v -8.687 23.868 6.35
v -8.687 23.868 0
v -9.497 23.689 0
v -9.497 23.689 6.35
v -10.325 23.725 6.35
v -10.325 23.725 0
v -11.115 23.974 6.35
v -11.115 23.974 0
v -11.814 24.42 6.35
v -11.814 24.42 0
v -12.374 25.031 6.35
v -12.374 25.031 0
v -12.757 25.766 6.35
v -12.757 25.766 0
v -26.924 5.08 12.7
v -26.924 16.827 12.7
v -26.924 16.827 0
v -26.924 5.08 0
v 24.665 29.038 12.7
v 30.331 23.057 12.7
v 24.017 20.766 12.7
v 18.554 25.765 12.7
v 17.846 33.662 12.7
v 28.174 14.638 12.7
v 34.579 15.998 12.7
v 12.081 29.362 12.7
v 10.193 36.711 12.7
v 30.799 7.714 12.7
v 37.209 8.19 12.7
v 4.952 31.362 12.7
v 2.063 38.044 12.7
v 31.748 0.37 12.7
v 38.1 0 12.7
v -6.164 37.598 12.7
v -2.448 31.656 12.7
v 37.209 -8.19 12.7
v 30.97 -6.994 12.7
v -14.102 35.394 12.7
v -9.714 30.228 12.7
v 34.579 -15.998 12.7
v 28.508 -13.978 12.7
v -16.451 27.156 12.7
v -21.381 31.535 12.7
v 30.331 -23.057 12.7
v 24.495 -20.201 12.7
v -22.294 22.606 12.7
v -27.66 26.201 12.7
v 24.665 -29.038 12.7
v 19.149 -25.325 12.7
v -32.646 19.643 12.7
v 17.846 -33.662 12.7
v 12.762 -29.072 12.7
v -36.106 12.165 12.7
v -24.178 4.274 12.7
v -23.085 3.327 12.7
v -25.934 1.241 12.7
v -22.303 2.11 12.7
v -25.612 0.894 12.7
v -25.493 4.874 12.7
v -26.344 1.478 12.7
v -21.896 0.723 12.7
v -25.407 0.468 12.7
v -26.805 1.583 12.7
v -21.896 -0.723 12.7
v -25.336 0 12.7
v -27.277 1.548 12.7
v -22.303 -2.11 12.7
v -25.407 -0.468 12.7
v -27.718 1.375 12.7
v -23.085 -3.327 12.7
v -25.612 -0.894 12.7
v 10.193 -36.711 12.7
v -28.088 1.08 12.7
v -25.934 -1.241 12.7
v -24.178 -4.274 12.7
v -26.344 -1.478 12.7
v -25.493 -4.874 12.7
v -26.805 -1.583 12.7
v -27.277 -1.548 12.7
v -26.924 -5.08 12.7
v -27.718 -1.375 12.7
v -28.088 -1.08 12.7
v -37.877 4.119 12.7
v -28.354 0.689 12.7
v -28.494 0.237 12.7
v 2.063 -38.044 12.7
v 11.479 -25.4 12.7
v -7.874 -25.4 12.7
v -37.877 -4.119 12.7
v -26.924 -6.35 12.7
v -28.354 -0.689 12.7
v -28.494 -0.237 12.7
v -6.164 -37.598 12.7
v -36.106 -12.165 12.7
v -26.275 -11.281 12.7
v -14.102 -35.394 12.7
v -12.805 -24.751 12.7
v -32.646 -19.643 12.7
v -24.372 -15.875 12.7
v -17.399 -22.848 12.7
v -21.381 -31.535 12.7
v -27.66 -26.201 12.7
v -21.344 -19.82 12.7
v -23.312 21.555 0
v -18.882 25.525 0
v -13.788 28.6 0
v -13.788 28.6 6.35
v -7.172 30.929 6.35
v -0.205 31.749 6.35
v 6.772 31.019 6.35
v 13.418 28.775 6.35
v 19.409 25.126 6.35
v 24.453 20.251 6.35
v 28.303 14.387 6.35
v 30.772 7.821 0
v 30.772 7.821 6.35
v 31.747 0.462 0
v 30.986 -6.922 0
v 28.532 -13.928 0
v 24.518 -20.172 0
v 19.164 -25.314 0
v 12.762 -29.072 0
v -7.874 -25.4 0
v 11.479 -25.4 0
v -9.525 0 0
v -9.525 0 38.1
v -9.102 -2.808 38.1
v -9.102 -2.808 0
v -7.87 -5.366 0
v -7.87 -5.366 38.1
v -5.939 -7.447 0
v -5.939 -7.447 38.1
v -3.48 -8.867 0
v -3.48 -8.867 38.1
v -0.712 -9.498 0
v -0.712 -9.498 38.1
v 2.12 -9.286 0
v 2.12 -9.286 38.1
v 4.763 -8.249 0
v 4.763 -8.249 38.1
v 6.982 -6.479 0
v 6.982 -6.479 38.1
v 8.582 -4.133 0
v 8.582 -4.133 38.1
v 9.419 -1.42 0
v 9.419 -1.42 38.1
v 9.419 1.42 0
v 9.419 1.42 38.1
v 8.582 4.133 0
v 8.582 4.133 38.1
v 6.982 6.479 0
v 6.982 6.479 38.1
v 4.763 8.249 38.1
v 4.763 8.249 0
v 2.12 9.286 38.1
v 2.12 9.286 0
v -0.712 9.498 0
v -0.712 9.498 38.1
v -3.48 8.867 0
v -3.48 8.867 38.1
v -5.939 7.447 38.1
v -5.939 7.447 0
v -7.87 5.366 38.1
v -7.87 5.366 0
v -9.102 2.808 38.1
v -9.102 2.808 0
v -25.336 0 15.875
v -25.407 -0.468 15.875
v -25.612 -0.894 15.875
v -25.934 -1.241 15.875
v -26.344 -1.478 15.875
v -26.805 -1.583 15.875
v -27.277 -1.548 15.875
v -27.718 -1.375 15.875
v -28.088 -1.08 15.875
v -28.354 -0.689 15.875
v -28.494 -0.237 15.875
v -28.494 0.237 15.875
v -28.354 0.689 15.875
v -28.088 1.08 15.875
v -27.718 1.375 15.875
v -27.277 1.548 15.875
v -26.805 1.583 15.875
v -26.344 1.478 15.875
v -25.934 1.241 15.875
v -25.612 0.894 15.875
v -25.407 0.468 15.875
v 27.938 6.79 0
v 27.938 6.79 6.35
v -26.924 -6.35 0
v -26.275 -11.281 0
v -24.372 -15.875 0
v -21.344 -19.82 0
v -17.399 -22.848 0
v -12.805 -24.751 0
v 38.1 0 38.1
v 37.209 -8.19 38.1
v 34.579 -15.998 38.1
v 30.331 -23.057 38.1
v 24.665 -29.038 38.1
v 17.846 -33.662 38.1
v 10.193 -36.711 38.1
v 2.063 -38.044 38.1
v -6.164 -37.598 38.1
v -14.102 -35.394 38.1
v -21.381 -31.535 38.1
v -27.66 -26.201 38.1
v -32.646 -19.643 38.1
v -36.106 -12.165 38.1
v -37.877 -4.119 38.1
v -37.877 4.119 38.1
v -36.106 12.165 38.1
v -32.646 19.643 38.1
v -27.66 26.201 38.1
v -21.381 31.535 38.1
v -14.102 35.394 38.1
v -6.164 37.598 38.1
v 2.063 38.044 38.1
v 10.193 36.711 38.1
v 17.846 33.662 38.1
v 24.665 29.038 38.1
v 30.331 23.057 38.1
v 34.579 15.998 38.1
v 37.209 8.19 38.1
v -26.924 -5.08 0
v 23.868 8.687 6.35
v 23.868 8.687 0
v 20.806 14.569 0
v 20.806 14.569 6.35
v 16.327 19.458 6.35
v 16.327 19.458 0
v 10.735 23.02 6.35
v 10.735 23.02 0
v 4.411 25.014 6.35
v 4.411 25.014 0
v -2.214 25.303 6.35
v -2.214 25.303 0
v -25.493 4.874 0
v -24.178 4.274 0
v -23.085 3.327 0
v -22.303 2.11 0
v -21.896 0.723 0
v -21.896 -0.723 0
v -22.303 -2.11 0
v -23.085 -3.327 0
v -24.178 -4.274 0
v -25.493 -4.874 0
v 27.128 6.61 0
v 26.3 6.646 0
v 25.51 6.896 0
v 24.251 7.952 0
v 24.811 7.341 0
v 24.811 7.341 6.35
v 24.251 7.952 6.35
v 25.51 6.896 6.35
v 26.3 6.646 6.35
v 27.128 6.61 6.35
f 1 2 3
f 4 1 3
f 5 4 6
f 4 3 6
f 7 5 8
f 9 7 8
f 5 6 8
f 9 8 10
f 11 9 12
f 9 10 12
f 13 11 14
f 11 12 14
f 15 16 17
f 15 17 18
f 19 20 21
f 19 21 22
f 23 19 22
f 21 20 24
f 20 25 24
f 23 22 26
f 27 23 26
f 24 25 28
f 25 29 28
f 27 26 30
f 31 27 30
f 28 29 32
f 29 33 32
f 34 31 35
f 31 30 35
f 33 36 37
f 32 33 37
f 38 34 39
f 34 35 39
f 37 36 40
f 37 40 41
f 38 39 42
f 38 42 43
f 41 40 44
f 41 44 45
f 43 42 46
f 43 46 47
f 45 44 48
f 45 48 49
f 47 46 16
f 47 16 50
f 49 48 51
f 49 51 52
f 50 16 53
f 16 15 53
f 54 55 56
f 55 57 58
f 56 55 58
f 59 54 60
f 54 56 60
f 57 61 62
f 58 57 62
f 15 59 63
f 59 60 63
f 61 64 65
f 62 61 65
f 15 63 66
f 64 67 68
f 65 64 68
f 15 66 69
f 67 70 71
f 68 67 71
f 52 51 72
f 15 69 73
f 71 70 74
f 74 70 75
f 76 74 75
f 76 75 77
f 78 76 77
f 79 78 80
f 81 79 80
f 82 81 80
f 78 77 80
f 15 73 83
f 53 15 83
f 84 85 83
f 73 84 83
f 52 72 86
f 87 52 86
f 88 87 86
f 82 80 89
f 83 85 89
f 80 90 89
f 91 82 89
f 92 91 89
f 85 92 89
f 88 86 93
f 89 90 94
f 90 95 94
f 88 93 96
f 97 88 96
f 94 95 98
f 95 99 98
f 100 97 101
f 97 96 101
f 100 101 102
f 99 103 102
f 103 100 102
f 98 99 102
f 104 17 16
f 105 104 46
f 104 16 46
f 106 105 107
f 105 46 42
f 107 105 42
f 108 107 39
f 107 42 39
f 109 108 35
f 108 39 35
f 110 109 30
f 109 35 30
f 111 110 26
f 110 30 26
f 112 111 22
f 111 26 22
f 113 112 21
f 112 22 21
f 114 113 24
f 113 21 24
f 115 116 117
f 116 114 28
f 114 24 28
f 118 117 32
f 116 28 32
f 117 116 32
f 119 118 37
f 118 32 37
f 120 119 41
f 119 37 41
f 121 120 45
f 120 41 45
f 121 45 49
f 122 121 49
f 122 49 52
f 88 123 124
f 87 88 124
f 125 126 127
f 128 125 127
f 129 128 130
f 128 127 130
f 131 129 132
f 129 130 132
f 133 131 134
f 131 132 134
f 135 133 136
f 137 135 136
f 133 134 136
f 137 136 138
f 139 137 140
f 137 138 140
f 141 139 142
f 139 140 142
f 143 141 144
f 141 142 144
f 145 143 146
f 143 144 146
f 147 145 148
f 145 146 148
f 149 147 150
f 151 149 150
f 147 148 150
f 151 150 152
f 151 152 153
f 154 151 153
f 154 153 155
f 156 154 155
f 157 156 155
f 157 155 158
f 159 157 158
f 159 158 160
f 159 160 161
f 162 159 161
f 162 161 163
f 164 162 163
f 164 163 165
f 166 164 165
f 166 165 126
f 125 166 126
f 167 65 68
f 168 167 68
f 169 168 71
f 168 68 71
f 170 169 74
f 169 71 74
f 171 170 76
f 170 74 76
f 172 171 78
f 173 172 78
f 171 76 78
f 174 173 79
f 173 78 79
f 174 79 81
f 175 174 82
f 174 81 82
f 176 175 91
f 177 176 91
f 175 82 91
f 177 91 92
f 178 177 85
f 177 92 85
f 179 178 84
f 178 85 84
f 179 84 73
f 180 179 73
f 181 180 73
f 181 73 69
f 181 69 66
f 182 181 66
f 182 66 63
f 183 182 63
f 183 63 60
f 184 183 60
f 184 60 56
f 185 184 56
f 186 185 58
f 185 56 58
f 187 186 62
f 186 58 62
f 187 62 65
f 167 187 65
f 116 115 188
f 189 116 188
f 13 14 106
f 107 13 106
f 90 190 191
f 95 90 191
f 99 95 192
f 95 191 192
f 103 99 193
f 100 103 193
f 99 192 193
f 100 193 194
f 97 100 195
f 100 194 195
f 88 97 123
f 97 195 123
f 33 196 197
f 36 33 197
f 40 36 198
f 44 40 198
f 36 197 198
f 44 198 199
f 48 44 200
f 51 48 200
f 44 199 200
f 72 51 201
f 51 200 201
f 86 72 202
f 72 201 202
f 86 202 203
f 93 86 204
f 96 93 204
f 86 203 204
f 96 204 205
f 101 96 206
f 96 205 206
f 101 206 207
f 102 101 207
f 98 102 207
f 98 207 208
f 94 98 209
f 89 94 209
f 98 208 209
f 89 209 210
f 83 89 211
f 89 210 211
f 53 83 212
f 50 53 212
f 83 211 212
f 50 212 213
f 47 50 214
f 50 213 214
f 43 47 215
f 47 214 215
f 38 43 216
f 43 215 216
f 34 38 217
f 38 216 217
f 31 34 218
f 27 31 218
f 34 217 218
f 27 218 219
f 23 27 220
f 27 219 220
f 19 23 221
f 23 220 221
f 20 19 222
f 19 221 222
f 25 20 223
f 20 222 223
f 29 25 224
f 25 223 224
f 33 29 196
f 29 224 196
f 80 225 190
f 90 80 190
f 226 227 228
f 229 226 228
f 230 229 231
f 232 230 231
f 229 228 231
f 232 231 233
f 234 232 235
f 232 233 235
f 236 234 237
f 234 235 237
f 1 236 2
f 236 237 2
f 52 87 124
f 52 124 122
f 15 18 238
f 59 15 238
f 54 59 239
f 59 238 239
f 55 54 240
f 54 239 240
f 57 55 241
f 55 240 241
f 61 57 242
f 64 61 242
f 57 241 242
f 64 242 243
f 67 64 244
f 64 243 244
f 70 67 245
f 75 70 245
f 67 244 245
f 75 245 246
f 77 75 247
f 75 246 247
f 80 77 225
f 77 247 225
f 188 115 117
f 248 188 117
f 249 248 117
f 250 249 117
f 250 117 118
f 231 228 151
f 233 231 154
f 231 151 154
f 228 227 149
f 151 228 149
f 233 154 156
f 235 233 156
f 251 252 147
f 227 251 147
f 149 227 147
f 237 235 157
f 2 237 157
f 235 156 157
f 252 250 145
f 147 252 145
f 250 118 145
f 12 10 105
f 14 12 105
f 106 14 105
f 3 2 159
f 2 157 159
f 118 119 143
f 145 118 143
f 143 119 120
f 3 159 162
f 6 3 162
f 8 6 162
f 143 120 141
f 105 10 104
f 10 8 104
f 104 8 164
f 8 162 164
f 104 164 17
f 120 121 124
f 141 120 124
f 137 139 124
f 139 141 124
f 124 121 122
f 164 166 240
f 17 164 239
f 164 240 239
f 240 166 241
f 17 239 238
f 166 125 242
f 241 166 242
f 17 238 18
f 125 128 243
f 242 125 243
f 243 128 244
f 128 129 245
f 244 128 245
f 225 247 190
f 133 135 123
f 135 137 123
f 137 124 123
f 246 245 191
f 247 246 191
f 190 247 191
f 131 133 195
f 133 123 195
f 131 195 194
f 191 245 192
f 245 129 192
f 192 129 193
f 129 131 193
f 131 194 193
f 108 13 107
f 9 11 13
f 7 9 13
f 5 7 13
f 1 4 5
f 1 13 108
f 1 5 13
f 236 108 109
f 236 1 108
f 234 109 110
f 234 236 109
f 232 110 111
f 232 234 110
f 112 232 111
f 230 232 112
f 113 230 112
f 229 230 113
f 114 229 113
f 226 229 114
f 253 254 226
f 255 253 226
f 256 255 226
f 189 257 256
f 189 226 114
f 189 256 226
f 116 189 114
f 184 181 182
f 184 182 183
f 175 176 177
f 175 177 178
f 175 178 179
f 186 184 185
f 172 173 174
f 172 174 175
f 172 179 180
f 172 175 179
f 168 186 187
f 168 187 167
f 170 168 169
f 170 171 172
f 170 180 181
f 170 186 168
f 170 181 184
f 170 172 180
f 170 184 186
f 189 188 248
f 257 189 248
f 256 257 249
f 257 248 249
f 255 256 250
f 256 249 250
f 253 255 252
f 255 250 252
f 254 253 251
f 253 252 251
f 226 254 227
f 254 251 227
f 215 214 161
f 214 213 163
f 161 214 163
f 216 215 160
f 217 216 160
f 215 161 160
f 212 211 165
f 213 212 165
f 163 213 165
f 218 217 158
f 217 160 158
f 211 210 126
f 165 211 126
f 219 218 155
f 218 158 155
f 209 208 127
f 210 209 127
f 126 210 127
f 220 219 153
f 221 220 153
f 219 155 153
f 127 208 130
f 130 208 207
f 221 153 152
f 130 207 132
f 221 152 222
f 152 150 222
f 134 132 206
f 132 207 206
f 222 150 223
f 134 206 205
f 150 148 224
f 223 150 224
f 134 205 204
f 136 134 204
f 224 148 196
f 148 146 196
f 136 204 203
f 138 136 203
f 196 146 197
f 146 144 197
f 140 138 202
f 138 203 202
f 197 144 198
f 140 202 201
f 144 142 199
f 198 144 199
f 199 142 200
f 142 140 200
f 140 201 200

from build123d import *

# Parameters (mm, degrees)
F3_DEPTH = 12.7
F5_DEPTH = 6.35
F7_D     = 19.05
F8_R     = 1.5875
F9_DEPTH = 3.175


with BuildPart() as f1:
    # F0 (on Front) → F1 (revolve)
    with BuildSketch(Plane.XZ):
        Polygon((0, 0), (31.75, 0), (31.75, 12.7), (38.1, 12.7), (38.1, 38.1), (0, 38.1), align=None)
    revolve(axis=Axis((0, 0, 19.05), (0, 0, -1)))

    # F2 (on face) → F3 (cut)
    with BuildSketch(Plane(origin=(0, 0, 0), x_dir=(1, 0, 0), z_dir=(0, 0, -1))):
        with BuildLine():
            Line((11.4793549074, 25.4), (12.7619952542, 29.0722200241))
            Line((12.7619952542, 29.0722200241), (20.2202573419, 33.7093167499))
            Line((20.2202573419, 33.7093167499), (-32.5390584767, 29.2297520235))
            Line((-32.5390584767, 29.2297520235), (-48.7152673304, -19.05))
            Line((-48.7152673304, -19.05), (-26.924, -19.05))
            Line((-26.924, -19.05), (-26.924, -5.08))
            ThreePointArc((-26.924, -5.08), (-21.844, 0), (-26.924, 5.08))
            Line((-26.924, 5.08), (-26.924, 6.35))
            ThreePointArc((-26.924, 6.35), (-21.3443841816, 19.8203841816), (-7.874, 25.4))
            Line((-7.874, 25.4), (11.4793549074, 25.4))
        make_face()
    extrude(amount=-F3_DEPTH, mode=Mode.SUBTRACT)

    # F4 (on face) → F5 (cut)
    with BuildSketch(Plane(origin=(0, 0, 0), x_dir=(1, 0, 0), z_dir=(0, 0, -1))):
        with BuildLine():
            ThreePointArc((23.868192568, -8.6873116405), (10.7345038482, -23.0202177907), (-8.6873116405, -23.868192568))
            ThreePointArc((-8.6873116405, -23.868192568), (-11.1150385766, -23.9741894151), (-12.7567496665, -25.7658026839))
            Line((-12.7567496665, -25.7658026839), (-28.8802481167, -70.0647505985))
            Line((-28.8802481167, -70.0647505985), (61.9316732098, -19.1625211791))
            Line((61.9316732098, -19.1625211791), (27.937630594, -6.7897015245))
            ThreePointArc((27.937630594, -6.7897015245), (25.5099036579, -6.8956983717), (23.868192568, -8.6873116405))
        make_face()
    extrude(amount=-F5_DEPTH, mode=Mode.SUBTRACT)

    # F7 (through all)
    with Locations(Plane(origin=(0, 0, 0), x_dir=(1, 0, 0), z_dir=(0, 0, -1))):
        with Locations((0, 0)):
            Hole(F7_D / 2)

    # F8 (on face) → F9 (cut)
    with BuildSketch(Plane(origin=(0, 0, 12.7), x_dir=(1, 0, 0), z_dir=(0, 0, -1))):
        with Locations((-26.924, 0)):
            Circle(F8_R)
    extrude(amount=-F9_DEPTH, mode=Mode.SUBTRACT)


solid = f1.part
